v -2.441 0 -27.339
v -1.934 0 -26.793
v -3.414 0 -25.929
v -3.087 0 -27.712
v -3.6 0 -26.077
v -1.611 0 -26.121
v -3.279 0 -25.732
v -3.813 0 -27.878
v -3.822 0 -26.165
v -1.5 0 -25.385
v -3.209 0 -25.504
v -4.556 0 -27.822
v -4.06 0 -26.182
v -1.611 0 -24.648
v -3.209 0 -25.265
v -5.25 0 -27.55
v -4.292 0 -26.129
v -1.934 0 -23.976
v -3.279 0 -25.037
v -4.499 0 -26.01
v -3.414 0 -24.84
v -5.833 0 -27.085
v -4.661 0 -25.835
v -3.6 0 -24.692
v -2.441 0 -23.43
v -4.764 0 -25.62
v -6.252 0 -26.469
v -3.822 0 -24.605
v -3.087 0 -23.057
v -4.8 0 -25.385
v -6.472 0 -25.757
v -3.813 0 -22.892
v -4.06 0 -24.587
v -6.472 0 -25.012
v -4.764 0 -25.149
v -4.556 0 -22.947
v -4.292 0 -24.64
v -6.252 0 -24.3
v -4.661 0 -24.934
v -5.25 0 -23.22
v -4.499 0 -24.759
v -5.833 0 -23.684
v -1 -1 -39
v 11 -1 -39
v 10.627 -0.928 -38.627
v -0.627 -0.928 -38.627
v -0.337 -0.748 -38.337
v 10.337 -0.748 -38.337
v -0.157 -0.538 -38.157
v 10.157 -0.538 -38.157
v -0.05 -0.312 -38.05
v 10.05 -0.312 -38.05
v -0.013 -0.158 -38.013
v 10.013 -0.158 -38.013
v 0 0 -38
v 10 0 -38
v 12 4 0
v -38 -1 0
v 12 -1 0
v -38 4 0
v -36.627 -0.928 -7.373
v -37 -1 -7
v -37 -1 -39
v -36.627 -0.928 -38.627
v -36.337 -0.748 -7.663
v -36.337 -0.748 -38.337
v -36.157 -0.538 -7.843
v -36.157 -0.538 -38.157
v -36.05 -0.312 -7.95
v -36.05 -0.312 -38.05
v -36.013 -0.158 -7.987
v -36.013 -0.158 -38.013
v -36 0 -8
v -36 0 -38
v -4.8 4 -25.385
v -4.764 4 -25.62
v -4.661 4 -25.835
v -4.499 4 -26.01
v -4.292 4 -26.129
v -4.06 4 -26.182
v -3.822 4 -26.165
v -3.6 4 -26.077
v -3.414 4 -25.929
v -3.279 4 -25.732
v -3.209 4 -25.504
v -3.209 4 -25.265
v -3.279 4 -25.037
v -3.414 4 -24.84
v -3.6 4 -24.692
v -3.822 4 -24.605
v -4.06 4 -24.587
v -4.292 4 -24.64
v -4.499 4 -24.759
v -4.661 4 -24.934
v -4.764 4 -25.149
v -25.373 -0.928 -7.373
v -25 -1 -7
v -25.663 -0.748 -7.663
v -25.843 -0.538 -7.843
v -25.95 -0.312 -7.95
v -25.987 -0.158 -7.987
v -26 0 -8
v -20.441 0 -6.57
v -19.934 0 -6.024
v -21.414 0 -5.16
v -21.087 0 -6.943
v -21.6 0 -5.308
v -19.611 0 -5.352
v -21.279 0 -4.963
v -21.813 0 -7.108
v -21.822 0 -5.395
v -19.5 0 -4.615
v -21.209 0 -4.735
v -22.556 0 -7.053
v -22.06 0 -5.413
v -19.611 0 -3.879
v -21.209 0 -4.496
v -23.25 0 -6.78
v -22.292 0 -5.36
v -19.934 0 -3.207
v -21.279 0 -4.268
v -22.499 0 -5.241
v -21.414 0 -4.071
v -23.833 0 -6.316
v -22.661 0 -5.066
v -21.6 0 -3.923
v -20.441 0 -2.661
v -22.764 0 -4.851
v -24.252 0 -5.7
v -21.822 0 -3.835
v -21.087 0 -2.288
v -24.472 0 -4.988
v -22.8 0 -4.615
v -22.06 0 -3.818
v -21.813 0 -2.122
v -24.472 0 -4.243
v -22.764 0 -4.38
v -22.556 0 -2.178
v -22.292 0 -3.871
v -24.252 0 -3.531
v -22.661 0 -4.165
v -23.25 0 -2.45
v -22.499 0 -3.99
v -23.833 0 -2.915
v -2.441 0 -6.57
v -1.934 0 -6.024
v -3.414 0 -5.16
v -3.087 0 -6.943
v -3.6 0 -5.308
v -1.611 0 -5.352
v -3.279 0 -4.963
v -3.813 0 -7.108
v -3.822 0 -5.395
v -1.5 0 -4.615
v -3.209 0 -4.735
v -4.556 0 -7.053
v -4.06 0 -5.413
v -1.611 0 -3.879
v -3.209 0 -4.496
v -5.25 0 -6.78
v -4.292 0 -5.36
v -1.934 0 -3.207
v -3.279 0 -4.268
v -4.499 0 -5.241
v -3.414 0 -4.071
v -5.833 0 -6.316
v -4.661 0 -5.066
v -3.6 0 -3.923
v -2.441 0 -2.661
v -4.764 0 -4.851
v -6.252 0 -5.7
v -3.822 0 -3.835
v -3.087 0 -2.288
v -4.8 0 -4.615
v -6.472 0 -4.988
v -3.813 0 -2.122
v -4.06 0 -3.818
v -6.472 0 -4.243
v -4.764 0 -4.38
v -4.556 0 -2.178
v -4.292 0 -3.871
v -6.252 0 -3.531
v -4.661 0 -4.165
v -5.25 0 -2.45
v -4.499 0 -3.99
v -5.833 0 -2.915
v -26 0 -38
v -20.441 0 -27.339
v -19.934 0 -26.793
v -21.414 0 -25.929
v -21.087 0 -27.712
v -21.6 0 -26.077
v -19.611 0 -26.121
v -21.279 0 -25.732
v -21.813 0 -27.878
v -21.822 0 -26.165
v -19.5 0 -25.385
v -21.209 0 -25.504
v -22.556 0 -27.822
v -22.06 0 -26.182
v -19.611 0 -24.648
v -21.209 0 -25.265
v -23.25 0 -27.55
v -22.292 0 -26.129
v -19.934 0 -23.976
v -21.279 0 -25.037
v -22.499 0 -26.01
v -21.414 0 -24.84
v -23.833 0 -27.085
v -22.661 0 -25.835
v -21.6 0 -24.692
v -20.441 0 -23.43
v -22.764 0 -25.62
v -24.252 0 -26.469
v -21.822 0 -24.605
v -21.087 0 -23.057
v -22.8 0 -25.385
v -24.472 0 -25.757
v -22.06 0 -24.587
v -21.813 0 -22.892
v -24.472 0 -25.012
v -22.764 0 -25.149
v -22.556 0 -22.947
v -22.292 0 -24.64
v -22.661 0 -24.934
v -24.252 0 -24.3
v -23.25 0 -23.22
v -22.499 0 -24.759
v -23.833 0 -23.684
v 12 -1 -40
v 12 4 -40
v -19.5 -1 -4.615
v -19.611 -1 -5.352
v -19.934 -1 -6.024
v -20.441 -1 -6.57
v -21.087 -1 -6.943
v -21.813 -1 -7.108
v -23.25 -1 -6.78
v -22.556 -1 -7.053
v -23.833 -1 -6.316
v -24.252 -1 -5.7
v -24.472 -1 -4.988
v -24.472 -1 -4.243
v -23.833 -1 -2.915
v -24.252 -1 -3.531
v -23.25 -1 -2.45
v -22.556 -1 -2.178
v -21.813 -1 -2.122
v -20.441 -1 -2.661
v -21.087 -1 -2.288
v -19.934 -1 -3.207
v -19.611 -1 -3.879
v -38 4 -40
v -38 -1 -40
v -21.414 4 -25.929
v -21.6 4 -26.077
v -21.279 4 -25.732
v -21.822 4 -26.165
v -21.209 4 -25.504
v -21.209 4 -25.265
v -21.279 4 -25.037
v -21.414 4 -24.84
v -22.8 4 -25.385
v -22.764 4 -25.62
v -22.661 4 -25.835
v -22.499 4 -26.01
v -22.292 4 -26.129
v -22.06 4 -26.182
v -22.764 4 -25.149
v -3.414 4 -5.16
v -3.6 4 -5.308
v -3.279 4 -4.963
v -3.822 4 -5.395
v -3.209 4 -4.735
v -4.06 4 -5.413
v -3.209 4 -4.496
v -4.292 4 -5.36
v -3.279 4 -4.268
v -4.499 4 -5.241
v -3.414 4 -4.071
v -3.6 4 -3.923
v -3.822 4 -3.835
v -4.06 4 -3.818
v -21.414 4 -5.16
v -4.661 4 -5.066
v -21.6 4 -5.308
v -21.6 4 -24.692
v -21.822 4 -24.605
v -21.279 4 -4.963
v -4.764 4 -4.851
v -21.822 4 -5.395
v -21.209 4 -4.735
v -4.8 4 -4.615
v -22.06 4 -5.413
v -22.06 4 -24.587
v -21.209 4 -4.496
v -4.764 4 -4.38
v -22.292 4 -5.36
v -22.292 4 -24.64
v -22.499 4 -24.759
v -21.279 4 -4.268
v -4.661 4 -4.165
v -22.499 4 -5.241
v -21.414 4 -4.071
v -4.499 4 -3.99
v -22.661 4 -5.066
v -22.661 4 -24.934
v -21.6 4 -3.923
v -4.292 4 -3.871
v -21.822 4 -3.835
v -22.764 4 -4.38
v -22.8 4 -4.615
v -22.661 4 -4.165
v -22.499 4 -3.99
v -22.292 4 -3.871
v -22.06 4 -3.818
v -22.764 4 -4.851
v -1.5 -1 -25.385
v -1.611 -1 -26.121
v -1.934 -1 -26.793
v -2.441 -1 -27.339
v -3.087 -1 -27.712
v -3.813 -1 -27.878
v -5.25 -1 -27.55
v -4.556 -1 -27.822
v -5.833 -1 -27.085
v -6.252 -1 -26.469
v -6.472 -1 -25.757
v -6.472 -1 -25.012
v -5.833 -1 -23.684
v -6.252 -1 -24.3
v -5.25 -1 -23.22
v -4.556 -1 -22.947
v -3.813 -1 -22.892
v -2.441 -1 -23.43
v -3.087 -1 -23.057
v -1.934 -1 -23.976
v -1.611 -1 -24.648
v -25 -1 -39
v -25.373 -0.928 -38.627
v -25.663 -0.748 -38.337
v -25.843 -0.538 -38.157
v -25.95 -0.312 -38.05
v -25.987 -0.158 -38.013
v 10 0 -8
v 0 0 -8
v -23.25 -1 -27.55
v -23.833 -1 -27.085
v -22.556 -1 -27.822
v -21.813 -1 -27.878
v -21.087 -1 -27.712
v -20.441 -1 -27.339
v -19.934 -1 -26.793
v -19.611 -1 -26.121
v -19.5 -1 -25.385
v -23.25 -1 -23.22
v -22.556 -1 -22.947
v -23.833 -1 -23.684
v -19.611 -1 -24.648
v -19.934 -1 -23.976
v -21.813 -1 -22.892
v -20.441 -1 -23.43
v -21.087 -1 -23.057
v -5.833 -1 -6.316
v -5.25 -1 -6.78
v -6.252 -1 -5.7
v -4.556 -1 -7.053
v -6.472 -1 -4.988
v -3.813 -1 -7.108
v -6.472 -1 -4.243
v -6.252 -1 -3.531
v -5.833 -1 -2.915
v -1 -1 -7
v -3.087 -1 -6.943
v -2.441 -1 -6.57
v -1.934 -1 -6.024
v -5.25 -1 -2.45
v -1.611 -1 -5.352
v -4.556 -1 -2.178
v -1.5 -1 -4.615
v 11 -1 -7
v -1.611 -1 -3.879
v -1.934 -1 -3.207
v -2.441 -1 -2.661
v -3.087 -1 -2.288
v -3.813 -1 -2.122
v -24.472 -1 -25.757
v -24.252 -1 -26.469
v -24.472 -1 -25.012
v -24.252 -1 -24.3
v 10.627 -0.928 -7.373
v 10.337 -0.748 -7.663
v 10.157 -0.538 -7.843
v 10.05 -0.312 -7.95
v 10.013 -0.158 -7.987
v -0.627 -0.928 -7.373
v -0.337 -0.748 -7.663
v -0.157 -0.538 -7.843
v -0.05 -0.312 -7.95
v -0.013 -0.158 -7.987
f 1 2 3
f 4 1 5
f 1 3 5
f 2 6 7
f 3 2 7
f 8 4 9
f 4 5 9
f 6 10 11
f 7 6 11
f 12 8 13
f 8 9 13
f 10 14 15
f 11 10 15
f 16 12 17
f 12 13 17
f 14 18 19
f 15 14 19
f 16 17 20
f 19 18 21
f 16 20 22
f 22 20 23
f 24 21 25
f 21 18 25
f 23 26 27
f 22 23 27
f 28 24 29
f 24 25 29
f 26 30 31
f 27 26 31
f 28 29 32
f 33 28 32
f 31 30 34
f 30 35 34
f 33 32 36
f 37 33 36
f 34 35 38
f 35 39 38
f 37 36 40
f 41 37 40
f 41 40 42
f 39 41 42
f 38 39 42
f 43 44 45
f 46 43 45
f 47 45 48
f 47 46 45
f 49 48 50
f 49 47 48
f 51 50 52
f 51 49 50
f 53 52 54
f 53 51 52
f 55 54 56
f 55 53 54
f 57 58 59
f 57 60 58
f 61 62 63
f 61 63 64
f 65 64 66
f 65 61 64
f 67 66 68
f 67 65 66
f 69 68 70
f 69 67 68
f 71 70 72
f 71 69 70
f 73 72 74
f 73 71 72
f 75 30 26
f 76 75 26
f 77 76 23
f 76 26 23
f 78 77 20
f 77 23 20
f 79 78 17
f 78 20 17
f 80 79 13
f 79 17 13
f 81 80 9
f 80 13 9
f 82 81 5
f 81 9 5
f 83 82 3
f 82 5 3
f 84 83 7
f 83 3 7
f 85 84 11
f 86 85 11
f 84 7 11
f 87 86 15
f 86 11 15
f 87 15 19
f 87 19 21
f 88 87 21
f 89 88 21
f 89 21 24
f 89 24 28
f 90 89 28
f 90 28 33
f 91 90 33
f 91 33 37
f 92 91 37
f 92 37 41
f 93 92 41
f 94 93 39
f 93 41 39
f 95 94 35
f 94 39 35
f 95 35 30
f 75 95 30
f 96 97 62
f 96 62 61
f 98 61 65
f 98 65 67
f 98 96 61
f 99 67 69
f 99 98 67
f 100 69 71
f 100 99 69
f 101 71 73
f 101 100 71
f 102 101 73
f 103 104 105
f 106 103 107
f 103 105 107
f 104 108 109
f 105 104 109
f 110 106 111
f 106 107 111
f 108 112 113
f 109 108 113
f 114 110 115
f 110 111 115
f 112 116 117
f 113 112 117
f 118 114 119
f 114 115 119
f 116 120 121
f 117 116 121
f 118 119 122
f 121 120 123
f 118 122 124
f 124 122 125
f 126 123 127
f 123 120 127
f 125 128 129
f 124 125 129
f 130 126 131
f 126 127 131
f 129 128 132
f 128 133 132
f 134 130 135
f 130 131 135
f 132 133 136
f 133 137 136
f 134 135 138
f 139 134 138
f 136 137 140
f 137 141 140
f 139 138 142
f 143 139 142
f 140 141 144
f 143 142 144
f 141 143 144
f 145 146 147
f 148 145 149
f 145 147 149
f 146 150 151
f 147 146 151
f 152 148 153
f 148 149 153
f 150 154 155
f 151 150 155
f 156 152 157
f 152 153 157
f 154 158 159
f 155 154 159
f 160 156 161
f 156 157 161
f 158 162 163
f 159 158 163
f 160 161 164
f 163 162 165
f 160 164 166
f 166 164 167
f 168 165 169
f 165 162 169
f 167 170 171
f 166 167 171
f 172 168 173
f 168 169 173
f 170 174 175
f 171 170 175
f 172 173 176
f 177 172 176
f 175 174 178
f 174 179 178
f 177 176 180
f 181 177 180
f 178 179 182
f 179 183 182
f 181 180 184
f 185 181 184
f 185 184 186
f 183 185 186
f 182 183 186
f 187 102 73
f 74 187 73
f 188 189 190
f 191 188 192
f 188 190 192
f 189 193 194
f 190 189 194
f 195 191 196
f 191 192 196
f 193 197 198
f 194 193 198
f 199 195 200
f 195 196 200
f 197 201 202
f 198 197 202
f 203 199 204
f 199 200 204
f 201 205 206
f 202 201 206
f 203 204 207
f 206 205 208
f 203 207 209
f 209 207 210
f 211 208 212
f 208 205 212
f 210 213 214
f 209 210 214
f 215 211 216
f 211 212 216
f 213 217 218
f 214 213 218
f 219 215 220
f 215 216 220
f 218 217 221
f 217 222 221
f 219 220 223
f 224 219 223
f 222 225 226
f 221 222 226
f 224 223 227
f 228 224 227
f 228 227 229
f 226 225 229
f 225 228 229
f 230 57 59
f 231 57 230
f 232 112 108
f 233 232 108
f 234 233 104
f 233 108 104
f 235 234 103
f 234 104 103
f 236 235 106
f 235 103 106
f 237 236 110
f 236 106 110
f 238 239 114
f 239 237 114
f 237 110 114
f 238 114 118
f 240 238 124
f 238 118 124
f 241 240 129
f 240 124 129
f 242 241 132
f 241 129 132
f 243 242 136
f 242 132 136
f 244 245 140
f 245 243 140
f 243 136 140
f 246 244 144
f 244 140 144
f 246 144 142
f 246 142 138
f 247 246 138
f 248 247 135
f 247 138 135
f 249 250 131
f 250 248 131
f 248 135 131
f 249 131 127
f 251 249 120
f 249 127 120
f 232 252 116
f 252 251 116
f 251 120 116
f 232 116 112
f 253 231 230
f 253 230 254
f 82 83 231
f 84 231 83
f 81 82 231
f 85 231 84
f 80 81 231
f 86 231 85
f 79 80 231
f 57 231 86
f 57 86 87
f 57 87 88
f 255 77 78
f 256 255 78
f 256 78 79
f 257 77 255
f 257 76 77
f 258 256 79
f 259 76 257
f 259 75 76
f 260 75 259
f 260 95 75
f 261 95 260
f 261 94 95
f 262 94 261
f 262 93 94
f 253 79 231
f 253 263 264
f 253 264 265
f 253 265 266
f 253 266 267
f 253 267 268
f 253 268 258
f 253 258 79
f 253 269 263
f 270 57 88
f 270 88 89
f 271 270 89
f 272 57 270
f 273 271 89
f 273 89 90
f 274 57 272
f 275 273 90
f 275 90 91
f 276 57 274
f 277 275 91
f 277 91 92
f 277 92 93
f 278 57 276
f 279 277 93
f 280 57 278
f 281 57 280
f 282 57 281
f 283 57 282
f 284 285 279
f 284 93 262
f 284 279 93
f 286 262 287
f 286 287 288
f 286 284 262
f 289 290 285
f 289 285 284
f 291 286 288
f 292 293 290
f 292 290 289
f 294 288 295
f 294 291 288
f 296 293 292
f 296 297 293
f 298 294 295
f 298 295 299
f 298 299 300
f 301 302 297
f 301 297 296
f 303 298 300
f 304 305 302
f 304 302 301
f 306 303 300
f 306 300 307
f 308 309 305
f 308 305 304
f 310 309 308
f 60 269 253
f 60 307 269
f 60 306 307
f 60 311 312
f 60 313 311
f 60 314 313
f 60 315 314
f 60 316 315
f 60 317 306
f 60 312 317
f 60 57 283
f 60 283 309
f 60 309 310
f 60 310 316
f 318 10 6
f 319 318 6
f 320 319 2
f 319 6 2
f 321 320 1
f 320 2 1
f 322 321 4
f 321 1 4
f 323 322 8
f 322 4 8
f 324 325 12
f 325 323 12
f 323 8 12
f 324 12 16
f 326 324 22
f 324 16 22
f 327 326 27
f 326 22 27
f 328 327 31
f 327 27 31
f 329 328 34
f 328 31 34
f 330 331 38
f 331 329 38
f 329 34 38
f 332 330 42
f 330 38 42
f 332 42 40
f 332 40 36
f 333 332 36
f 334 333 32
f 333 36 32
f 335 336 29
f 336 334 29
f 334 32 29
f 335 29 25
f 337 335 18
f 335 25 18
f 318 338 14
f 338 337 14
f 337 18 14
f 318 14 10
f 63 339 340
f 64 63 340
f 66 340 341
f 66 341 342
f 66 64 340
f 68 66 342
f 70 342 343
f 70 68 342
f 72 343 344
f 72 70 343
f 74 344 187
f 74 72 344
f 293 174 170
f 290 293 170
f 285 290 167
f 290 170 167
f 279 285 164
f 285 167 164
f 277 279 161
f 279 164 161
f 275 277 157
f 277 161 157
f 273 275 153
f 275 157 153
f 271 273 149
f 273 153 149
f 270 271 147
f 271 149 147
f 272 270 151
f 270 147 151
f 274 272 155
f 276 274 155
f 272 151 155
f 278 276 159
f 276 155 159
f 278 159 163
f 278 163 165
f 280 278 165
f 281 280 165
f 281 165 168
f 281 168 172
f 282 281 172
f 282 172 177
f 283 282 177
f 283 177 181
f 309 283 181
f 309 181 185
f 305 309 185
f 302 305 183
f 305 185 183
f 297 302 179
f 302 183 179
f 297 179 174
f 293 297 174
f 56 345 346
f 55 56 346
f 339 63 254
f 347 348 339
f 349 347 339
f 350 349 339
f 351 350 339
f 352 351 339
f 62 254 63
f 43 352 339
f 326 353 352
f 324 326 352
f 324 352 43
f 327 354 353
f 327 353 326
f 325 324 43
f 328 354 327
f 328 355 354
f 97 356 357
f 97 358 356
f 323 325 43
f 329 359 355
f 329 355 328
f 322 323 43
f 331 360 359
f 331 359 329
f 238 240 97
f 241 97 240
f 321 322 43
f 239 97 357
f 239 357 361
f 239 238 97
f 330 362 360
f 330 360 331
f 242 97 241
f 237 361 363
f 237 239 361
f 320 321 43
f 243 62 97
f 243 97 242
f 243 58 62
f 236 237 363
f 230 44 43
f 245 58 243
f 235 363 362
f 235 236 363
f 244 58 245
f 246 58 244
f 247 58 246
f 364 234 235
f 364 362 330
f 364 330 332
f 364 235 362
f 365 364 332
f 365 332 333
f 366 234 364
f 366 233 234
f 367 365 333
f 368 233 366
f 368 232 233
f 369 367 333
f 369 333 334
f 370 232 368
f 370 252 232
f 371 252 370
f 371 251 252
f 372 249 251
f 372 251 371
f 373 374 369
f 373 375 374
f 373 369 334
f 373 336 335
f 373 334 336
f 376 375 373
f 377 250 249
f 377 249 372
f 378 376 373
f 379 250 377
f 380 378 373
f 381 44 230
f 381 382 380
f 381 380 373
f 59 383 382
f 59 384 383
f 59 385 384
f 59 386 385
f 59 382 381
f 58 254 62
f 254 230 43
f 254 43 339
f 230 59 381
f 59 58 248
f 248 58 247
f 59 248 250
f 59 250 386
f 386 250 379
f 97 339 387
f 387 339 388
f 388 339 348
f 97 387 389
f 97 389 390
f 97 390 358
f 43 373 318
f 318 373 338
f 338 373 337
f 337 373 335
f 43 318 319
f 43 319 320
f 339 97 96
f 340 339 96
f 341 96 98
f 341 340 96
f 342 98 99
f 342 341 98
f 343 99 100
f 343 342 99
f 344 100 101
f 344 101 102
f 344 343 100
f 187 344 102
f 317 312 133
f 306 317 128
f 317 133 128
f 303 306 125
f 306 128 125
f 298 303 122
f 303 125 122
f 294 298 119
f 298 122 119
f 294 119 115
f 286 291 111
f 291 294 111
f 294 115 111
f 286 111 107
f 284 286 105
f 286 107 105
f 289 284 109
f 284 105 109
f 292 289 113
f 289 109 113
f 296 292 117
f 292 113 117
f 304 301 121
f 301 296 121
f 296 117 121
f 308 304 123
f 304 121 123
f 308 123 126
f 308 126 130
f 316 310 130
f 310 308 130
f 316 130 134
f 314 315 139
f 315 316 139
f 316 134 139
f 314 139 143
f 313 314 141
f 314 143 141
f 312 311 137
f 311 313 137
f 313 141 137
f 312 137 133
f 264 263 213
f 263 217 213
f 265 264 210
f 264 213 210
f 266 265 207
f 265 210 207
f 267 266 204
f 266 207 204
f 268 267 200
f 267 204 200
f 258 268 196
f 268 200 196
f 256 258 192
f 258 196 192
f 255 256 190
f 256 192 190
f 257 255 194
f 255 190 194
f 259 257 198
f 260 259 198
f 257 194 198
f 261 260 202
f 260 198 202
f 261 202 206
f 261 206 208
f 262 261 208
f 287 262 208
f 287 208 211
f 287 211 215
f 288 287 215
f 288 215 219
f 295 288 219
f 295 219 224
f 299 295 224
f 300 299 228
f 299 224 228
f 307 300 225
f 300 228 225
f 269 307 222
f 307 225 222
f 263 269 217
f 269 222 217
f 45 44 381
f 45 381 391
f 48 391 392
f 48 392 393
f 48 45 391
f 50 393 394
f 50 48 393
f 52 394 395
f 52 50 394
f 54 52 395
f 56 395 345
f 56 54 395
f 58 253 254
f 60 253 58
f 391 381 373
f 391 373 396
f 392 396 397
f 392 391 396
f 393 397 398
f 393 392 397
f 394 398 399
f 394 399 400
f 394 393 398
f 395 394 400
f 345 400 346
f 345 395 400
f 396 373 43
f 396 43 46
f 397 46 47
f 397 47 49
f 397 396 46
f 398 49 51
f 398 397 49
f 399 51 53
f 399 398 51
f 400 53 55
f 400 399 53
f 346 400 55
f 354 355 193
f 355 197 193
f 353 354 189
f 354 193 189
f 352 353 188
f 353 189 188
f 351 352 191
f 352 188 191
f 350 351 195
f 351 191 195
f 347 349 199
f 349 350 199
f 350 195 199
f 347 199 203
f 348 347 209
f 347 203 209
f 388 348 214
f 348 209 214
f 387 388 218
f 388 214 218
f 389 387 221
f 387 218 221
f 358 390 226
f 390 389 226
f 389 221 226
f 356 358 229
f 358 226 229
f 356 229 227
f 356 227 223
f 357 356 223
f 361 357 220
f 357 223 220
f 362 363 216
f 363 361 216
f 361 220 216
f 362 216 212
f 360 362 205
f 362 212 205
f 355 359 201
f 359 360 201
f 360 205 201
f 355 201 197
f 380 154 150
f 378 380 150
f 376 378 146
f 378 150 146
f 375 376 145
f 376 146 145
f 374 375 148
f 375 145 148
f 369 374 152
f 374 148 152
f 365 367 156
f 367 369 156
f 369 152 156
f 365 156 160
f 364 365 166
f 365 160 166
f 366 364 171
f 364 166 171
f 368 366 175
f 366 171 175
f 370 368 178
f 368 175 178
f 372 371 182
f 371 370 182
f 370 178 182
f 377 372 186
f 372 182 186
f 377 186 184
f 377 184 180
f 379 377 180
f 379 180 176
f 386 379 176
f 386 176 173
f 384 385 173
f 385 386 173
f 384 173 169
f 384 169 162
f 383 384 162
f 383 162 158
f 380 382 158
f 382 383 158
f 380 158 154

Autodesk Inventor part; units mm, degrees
ref_plane "YZ Plane" through (0, 0, 0) normal (1, 0, 0) x (0, 1, 0)
ref_plane "XZ Plane" through (0, 0, 0) normal (0, 1, 0) x (-1, 0, 0)
ref_plane "XY Plane" through (0, 0, 0) normal (0, 0, 1) x (1, 0, 0)
sketch "スケッチ1" plane through (0, 0, 0) normal (0, 1, 0) x (-1, 0, 0)
  line L0 (26, 0) -> (0, 0)
  line L1 (0, 0) -> (0, -30)
  line L2 (0, -30) -> (26, -30)
  line L3 (26, -30) -> (26, 0)
  line L4 (26, 0) -> (27.9445, -37.1034)
  line L5 (0, 0) -> (-1.9445, -37.1034)
  arc A0 (-1.9445, -37.1034) -> (27.9445, -37.1034) centre (13, 0) ccw
  line L6 (0, 0) -> (26, -30)
  line L7 (0, -30) -> (26, 0)
  line L8 (4, -4.6154) -> (22, -4.6154)
  line L9 (22, -4.6154) -> (22, -25.3846)
  line L10 (22, -25.3846) -> (4, -25.3846)
  line L11 (4, -25.3846) -> (4, -4.6154)
  circle A1 centre (4, -4.6154) radius 0.8
  circle A2 centre (4, -25.3846) radius 0.8
  circle A3 centre (22, -4.6154) radius 0.8
  circle A4 centre (22, -25.3846) radius 0.8
  line L12 (38, 0) -> (-12, 0)
  line L13 (-12, 0) -> (-12, -40)
  line L14 (-12, -40) -> (38, -40)
  line L15 (38, -40) -> (38, 0)
  point P0 (13, -40)
  point P1 (13, -40)
  dimension "d0" = 26
  dimension "d3" = 30
  dimension "d4" = 3
  dimension "d5" = 3
  dimension "d6" = 40
  dimension "d17" = 4
  dimension "d18" = 1.6
  dimension "d19" = 1.6
  dimension "d20" = 1.6
  dimension "d21" = 1.6
  dimension "d28" = 50
extrude "押し出し1" add sketch "スケッチ1" along normal blind 4 contours L7 A3 L8 A1 L6 L0 | L4 A0 L5 L1 L2 L3 | L12 L15 L14 A0 L4 | L3 L6 A4 L9 A3 L7 | L6 A1 L11 A2 L7 L1 | L5 A0 L14 L13 L12 | L2 L7 A2 L10 A4 L6 | A3 L7 L6 A1 L8 | A1 L6 L7 A2 L11 | L10 A2 L7 L6 A4 | A3 L9 A4 L6 L7
sketch "スケッチ4" plane through (0, 0, 0) normal (0, -1, 0) x (1, 0, 0)
  line L0 (-38, 0) -> (12, 0) projected
  line L1 (-38, -40) -> (-38, 0) projected
  line L2 (12, -40) -> (-38, -40) projected
  line L3 (12, 0) -> (12, -40) projected
  circle A0 centre (-4, -25.3846) radius 0.8 projected
  circle A1 centre (-22, -25.3846) radius 0.8 projected
  circle A2 centre (-4, -4.6154) radius 0.8 projected
  circle A3 centre (-22, -4.6154) radius 0.8 projected
  circle A4 centre (-22, -4.6154) radius 2.5
  circle A5 centre (-4, -4.6154) radius 2.5
  circle A6 centre (-4, -25.3846) radius 2.5
  circle A7 centre (-22, -25.3846) radius 2.5
  line L4 (-36, -8) -> (-26, -8)
  line L5 (-26, -8) -> (-26, -38)
  line L6 (-26, -38) -> (-36, -38)
  line L7 (-36, -38) -> (-36, -8)
  line L8 (0, -8) -> (10, -8)
  line L9 (10, -8) -> (10, -38)
  line L10 (10, -38) -> (0, -38)
  line L11 (0, -38) -> (0, -8)
  point P0 (0, 0)
  dimension "d29" = 5
  dimension "d32" = 10
  dimension "d33" = 30
  dimension "d34" = 10
  dimension "d35" = 30
  dimension "d36" = 2
  dimension "d37" = 2
  dimension "d38" = 2
extrude "押し出し5" add sketch "スケッチ4" along normal blind 1 contours L0 L3 L2 L1
fillet "フィレット3" radius 1 8 edges at (-31, -1, -8) (-26, -1, -23) (-31, -1, -38) (-36, -1, -23) (0, -1, -23) (10, -1, -23) (5, -1, -8) (5, -1, -38)
properties part number "toe_sole_back"
